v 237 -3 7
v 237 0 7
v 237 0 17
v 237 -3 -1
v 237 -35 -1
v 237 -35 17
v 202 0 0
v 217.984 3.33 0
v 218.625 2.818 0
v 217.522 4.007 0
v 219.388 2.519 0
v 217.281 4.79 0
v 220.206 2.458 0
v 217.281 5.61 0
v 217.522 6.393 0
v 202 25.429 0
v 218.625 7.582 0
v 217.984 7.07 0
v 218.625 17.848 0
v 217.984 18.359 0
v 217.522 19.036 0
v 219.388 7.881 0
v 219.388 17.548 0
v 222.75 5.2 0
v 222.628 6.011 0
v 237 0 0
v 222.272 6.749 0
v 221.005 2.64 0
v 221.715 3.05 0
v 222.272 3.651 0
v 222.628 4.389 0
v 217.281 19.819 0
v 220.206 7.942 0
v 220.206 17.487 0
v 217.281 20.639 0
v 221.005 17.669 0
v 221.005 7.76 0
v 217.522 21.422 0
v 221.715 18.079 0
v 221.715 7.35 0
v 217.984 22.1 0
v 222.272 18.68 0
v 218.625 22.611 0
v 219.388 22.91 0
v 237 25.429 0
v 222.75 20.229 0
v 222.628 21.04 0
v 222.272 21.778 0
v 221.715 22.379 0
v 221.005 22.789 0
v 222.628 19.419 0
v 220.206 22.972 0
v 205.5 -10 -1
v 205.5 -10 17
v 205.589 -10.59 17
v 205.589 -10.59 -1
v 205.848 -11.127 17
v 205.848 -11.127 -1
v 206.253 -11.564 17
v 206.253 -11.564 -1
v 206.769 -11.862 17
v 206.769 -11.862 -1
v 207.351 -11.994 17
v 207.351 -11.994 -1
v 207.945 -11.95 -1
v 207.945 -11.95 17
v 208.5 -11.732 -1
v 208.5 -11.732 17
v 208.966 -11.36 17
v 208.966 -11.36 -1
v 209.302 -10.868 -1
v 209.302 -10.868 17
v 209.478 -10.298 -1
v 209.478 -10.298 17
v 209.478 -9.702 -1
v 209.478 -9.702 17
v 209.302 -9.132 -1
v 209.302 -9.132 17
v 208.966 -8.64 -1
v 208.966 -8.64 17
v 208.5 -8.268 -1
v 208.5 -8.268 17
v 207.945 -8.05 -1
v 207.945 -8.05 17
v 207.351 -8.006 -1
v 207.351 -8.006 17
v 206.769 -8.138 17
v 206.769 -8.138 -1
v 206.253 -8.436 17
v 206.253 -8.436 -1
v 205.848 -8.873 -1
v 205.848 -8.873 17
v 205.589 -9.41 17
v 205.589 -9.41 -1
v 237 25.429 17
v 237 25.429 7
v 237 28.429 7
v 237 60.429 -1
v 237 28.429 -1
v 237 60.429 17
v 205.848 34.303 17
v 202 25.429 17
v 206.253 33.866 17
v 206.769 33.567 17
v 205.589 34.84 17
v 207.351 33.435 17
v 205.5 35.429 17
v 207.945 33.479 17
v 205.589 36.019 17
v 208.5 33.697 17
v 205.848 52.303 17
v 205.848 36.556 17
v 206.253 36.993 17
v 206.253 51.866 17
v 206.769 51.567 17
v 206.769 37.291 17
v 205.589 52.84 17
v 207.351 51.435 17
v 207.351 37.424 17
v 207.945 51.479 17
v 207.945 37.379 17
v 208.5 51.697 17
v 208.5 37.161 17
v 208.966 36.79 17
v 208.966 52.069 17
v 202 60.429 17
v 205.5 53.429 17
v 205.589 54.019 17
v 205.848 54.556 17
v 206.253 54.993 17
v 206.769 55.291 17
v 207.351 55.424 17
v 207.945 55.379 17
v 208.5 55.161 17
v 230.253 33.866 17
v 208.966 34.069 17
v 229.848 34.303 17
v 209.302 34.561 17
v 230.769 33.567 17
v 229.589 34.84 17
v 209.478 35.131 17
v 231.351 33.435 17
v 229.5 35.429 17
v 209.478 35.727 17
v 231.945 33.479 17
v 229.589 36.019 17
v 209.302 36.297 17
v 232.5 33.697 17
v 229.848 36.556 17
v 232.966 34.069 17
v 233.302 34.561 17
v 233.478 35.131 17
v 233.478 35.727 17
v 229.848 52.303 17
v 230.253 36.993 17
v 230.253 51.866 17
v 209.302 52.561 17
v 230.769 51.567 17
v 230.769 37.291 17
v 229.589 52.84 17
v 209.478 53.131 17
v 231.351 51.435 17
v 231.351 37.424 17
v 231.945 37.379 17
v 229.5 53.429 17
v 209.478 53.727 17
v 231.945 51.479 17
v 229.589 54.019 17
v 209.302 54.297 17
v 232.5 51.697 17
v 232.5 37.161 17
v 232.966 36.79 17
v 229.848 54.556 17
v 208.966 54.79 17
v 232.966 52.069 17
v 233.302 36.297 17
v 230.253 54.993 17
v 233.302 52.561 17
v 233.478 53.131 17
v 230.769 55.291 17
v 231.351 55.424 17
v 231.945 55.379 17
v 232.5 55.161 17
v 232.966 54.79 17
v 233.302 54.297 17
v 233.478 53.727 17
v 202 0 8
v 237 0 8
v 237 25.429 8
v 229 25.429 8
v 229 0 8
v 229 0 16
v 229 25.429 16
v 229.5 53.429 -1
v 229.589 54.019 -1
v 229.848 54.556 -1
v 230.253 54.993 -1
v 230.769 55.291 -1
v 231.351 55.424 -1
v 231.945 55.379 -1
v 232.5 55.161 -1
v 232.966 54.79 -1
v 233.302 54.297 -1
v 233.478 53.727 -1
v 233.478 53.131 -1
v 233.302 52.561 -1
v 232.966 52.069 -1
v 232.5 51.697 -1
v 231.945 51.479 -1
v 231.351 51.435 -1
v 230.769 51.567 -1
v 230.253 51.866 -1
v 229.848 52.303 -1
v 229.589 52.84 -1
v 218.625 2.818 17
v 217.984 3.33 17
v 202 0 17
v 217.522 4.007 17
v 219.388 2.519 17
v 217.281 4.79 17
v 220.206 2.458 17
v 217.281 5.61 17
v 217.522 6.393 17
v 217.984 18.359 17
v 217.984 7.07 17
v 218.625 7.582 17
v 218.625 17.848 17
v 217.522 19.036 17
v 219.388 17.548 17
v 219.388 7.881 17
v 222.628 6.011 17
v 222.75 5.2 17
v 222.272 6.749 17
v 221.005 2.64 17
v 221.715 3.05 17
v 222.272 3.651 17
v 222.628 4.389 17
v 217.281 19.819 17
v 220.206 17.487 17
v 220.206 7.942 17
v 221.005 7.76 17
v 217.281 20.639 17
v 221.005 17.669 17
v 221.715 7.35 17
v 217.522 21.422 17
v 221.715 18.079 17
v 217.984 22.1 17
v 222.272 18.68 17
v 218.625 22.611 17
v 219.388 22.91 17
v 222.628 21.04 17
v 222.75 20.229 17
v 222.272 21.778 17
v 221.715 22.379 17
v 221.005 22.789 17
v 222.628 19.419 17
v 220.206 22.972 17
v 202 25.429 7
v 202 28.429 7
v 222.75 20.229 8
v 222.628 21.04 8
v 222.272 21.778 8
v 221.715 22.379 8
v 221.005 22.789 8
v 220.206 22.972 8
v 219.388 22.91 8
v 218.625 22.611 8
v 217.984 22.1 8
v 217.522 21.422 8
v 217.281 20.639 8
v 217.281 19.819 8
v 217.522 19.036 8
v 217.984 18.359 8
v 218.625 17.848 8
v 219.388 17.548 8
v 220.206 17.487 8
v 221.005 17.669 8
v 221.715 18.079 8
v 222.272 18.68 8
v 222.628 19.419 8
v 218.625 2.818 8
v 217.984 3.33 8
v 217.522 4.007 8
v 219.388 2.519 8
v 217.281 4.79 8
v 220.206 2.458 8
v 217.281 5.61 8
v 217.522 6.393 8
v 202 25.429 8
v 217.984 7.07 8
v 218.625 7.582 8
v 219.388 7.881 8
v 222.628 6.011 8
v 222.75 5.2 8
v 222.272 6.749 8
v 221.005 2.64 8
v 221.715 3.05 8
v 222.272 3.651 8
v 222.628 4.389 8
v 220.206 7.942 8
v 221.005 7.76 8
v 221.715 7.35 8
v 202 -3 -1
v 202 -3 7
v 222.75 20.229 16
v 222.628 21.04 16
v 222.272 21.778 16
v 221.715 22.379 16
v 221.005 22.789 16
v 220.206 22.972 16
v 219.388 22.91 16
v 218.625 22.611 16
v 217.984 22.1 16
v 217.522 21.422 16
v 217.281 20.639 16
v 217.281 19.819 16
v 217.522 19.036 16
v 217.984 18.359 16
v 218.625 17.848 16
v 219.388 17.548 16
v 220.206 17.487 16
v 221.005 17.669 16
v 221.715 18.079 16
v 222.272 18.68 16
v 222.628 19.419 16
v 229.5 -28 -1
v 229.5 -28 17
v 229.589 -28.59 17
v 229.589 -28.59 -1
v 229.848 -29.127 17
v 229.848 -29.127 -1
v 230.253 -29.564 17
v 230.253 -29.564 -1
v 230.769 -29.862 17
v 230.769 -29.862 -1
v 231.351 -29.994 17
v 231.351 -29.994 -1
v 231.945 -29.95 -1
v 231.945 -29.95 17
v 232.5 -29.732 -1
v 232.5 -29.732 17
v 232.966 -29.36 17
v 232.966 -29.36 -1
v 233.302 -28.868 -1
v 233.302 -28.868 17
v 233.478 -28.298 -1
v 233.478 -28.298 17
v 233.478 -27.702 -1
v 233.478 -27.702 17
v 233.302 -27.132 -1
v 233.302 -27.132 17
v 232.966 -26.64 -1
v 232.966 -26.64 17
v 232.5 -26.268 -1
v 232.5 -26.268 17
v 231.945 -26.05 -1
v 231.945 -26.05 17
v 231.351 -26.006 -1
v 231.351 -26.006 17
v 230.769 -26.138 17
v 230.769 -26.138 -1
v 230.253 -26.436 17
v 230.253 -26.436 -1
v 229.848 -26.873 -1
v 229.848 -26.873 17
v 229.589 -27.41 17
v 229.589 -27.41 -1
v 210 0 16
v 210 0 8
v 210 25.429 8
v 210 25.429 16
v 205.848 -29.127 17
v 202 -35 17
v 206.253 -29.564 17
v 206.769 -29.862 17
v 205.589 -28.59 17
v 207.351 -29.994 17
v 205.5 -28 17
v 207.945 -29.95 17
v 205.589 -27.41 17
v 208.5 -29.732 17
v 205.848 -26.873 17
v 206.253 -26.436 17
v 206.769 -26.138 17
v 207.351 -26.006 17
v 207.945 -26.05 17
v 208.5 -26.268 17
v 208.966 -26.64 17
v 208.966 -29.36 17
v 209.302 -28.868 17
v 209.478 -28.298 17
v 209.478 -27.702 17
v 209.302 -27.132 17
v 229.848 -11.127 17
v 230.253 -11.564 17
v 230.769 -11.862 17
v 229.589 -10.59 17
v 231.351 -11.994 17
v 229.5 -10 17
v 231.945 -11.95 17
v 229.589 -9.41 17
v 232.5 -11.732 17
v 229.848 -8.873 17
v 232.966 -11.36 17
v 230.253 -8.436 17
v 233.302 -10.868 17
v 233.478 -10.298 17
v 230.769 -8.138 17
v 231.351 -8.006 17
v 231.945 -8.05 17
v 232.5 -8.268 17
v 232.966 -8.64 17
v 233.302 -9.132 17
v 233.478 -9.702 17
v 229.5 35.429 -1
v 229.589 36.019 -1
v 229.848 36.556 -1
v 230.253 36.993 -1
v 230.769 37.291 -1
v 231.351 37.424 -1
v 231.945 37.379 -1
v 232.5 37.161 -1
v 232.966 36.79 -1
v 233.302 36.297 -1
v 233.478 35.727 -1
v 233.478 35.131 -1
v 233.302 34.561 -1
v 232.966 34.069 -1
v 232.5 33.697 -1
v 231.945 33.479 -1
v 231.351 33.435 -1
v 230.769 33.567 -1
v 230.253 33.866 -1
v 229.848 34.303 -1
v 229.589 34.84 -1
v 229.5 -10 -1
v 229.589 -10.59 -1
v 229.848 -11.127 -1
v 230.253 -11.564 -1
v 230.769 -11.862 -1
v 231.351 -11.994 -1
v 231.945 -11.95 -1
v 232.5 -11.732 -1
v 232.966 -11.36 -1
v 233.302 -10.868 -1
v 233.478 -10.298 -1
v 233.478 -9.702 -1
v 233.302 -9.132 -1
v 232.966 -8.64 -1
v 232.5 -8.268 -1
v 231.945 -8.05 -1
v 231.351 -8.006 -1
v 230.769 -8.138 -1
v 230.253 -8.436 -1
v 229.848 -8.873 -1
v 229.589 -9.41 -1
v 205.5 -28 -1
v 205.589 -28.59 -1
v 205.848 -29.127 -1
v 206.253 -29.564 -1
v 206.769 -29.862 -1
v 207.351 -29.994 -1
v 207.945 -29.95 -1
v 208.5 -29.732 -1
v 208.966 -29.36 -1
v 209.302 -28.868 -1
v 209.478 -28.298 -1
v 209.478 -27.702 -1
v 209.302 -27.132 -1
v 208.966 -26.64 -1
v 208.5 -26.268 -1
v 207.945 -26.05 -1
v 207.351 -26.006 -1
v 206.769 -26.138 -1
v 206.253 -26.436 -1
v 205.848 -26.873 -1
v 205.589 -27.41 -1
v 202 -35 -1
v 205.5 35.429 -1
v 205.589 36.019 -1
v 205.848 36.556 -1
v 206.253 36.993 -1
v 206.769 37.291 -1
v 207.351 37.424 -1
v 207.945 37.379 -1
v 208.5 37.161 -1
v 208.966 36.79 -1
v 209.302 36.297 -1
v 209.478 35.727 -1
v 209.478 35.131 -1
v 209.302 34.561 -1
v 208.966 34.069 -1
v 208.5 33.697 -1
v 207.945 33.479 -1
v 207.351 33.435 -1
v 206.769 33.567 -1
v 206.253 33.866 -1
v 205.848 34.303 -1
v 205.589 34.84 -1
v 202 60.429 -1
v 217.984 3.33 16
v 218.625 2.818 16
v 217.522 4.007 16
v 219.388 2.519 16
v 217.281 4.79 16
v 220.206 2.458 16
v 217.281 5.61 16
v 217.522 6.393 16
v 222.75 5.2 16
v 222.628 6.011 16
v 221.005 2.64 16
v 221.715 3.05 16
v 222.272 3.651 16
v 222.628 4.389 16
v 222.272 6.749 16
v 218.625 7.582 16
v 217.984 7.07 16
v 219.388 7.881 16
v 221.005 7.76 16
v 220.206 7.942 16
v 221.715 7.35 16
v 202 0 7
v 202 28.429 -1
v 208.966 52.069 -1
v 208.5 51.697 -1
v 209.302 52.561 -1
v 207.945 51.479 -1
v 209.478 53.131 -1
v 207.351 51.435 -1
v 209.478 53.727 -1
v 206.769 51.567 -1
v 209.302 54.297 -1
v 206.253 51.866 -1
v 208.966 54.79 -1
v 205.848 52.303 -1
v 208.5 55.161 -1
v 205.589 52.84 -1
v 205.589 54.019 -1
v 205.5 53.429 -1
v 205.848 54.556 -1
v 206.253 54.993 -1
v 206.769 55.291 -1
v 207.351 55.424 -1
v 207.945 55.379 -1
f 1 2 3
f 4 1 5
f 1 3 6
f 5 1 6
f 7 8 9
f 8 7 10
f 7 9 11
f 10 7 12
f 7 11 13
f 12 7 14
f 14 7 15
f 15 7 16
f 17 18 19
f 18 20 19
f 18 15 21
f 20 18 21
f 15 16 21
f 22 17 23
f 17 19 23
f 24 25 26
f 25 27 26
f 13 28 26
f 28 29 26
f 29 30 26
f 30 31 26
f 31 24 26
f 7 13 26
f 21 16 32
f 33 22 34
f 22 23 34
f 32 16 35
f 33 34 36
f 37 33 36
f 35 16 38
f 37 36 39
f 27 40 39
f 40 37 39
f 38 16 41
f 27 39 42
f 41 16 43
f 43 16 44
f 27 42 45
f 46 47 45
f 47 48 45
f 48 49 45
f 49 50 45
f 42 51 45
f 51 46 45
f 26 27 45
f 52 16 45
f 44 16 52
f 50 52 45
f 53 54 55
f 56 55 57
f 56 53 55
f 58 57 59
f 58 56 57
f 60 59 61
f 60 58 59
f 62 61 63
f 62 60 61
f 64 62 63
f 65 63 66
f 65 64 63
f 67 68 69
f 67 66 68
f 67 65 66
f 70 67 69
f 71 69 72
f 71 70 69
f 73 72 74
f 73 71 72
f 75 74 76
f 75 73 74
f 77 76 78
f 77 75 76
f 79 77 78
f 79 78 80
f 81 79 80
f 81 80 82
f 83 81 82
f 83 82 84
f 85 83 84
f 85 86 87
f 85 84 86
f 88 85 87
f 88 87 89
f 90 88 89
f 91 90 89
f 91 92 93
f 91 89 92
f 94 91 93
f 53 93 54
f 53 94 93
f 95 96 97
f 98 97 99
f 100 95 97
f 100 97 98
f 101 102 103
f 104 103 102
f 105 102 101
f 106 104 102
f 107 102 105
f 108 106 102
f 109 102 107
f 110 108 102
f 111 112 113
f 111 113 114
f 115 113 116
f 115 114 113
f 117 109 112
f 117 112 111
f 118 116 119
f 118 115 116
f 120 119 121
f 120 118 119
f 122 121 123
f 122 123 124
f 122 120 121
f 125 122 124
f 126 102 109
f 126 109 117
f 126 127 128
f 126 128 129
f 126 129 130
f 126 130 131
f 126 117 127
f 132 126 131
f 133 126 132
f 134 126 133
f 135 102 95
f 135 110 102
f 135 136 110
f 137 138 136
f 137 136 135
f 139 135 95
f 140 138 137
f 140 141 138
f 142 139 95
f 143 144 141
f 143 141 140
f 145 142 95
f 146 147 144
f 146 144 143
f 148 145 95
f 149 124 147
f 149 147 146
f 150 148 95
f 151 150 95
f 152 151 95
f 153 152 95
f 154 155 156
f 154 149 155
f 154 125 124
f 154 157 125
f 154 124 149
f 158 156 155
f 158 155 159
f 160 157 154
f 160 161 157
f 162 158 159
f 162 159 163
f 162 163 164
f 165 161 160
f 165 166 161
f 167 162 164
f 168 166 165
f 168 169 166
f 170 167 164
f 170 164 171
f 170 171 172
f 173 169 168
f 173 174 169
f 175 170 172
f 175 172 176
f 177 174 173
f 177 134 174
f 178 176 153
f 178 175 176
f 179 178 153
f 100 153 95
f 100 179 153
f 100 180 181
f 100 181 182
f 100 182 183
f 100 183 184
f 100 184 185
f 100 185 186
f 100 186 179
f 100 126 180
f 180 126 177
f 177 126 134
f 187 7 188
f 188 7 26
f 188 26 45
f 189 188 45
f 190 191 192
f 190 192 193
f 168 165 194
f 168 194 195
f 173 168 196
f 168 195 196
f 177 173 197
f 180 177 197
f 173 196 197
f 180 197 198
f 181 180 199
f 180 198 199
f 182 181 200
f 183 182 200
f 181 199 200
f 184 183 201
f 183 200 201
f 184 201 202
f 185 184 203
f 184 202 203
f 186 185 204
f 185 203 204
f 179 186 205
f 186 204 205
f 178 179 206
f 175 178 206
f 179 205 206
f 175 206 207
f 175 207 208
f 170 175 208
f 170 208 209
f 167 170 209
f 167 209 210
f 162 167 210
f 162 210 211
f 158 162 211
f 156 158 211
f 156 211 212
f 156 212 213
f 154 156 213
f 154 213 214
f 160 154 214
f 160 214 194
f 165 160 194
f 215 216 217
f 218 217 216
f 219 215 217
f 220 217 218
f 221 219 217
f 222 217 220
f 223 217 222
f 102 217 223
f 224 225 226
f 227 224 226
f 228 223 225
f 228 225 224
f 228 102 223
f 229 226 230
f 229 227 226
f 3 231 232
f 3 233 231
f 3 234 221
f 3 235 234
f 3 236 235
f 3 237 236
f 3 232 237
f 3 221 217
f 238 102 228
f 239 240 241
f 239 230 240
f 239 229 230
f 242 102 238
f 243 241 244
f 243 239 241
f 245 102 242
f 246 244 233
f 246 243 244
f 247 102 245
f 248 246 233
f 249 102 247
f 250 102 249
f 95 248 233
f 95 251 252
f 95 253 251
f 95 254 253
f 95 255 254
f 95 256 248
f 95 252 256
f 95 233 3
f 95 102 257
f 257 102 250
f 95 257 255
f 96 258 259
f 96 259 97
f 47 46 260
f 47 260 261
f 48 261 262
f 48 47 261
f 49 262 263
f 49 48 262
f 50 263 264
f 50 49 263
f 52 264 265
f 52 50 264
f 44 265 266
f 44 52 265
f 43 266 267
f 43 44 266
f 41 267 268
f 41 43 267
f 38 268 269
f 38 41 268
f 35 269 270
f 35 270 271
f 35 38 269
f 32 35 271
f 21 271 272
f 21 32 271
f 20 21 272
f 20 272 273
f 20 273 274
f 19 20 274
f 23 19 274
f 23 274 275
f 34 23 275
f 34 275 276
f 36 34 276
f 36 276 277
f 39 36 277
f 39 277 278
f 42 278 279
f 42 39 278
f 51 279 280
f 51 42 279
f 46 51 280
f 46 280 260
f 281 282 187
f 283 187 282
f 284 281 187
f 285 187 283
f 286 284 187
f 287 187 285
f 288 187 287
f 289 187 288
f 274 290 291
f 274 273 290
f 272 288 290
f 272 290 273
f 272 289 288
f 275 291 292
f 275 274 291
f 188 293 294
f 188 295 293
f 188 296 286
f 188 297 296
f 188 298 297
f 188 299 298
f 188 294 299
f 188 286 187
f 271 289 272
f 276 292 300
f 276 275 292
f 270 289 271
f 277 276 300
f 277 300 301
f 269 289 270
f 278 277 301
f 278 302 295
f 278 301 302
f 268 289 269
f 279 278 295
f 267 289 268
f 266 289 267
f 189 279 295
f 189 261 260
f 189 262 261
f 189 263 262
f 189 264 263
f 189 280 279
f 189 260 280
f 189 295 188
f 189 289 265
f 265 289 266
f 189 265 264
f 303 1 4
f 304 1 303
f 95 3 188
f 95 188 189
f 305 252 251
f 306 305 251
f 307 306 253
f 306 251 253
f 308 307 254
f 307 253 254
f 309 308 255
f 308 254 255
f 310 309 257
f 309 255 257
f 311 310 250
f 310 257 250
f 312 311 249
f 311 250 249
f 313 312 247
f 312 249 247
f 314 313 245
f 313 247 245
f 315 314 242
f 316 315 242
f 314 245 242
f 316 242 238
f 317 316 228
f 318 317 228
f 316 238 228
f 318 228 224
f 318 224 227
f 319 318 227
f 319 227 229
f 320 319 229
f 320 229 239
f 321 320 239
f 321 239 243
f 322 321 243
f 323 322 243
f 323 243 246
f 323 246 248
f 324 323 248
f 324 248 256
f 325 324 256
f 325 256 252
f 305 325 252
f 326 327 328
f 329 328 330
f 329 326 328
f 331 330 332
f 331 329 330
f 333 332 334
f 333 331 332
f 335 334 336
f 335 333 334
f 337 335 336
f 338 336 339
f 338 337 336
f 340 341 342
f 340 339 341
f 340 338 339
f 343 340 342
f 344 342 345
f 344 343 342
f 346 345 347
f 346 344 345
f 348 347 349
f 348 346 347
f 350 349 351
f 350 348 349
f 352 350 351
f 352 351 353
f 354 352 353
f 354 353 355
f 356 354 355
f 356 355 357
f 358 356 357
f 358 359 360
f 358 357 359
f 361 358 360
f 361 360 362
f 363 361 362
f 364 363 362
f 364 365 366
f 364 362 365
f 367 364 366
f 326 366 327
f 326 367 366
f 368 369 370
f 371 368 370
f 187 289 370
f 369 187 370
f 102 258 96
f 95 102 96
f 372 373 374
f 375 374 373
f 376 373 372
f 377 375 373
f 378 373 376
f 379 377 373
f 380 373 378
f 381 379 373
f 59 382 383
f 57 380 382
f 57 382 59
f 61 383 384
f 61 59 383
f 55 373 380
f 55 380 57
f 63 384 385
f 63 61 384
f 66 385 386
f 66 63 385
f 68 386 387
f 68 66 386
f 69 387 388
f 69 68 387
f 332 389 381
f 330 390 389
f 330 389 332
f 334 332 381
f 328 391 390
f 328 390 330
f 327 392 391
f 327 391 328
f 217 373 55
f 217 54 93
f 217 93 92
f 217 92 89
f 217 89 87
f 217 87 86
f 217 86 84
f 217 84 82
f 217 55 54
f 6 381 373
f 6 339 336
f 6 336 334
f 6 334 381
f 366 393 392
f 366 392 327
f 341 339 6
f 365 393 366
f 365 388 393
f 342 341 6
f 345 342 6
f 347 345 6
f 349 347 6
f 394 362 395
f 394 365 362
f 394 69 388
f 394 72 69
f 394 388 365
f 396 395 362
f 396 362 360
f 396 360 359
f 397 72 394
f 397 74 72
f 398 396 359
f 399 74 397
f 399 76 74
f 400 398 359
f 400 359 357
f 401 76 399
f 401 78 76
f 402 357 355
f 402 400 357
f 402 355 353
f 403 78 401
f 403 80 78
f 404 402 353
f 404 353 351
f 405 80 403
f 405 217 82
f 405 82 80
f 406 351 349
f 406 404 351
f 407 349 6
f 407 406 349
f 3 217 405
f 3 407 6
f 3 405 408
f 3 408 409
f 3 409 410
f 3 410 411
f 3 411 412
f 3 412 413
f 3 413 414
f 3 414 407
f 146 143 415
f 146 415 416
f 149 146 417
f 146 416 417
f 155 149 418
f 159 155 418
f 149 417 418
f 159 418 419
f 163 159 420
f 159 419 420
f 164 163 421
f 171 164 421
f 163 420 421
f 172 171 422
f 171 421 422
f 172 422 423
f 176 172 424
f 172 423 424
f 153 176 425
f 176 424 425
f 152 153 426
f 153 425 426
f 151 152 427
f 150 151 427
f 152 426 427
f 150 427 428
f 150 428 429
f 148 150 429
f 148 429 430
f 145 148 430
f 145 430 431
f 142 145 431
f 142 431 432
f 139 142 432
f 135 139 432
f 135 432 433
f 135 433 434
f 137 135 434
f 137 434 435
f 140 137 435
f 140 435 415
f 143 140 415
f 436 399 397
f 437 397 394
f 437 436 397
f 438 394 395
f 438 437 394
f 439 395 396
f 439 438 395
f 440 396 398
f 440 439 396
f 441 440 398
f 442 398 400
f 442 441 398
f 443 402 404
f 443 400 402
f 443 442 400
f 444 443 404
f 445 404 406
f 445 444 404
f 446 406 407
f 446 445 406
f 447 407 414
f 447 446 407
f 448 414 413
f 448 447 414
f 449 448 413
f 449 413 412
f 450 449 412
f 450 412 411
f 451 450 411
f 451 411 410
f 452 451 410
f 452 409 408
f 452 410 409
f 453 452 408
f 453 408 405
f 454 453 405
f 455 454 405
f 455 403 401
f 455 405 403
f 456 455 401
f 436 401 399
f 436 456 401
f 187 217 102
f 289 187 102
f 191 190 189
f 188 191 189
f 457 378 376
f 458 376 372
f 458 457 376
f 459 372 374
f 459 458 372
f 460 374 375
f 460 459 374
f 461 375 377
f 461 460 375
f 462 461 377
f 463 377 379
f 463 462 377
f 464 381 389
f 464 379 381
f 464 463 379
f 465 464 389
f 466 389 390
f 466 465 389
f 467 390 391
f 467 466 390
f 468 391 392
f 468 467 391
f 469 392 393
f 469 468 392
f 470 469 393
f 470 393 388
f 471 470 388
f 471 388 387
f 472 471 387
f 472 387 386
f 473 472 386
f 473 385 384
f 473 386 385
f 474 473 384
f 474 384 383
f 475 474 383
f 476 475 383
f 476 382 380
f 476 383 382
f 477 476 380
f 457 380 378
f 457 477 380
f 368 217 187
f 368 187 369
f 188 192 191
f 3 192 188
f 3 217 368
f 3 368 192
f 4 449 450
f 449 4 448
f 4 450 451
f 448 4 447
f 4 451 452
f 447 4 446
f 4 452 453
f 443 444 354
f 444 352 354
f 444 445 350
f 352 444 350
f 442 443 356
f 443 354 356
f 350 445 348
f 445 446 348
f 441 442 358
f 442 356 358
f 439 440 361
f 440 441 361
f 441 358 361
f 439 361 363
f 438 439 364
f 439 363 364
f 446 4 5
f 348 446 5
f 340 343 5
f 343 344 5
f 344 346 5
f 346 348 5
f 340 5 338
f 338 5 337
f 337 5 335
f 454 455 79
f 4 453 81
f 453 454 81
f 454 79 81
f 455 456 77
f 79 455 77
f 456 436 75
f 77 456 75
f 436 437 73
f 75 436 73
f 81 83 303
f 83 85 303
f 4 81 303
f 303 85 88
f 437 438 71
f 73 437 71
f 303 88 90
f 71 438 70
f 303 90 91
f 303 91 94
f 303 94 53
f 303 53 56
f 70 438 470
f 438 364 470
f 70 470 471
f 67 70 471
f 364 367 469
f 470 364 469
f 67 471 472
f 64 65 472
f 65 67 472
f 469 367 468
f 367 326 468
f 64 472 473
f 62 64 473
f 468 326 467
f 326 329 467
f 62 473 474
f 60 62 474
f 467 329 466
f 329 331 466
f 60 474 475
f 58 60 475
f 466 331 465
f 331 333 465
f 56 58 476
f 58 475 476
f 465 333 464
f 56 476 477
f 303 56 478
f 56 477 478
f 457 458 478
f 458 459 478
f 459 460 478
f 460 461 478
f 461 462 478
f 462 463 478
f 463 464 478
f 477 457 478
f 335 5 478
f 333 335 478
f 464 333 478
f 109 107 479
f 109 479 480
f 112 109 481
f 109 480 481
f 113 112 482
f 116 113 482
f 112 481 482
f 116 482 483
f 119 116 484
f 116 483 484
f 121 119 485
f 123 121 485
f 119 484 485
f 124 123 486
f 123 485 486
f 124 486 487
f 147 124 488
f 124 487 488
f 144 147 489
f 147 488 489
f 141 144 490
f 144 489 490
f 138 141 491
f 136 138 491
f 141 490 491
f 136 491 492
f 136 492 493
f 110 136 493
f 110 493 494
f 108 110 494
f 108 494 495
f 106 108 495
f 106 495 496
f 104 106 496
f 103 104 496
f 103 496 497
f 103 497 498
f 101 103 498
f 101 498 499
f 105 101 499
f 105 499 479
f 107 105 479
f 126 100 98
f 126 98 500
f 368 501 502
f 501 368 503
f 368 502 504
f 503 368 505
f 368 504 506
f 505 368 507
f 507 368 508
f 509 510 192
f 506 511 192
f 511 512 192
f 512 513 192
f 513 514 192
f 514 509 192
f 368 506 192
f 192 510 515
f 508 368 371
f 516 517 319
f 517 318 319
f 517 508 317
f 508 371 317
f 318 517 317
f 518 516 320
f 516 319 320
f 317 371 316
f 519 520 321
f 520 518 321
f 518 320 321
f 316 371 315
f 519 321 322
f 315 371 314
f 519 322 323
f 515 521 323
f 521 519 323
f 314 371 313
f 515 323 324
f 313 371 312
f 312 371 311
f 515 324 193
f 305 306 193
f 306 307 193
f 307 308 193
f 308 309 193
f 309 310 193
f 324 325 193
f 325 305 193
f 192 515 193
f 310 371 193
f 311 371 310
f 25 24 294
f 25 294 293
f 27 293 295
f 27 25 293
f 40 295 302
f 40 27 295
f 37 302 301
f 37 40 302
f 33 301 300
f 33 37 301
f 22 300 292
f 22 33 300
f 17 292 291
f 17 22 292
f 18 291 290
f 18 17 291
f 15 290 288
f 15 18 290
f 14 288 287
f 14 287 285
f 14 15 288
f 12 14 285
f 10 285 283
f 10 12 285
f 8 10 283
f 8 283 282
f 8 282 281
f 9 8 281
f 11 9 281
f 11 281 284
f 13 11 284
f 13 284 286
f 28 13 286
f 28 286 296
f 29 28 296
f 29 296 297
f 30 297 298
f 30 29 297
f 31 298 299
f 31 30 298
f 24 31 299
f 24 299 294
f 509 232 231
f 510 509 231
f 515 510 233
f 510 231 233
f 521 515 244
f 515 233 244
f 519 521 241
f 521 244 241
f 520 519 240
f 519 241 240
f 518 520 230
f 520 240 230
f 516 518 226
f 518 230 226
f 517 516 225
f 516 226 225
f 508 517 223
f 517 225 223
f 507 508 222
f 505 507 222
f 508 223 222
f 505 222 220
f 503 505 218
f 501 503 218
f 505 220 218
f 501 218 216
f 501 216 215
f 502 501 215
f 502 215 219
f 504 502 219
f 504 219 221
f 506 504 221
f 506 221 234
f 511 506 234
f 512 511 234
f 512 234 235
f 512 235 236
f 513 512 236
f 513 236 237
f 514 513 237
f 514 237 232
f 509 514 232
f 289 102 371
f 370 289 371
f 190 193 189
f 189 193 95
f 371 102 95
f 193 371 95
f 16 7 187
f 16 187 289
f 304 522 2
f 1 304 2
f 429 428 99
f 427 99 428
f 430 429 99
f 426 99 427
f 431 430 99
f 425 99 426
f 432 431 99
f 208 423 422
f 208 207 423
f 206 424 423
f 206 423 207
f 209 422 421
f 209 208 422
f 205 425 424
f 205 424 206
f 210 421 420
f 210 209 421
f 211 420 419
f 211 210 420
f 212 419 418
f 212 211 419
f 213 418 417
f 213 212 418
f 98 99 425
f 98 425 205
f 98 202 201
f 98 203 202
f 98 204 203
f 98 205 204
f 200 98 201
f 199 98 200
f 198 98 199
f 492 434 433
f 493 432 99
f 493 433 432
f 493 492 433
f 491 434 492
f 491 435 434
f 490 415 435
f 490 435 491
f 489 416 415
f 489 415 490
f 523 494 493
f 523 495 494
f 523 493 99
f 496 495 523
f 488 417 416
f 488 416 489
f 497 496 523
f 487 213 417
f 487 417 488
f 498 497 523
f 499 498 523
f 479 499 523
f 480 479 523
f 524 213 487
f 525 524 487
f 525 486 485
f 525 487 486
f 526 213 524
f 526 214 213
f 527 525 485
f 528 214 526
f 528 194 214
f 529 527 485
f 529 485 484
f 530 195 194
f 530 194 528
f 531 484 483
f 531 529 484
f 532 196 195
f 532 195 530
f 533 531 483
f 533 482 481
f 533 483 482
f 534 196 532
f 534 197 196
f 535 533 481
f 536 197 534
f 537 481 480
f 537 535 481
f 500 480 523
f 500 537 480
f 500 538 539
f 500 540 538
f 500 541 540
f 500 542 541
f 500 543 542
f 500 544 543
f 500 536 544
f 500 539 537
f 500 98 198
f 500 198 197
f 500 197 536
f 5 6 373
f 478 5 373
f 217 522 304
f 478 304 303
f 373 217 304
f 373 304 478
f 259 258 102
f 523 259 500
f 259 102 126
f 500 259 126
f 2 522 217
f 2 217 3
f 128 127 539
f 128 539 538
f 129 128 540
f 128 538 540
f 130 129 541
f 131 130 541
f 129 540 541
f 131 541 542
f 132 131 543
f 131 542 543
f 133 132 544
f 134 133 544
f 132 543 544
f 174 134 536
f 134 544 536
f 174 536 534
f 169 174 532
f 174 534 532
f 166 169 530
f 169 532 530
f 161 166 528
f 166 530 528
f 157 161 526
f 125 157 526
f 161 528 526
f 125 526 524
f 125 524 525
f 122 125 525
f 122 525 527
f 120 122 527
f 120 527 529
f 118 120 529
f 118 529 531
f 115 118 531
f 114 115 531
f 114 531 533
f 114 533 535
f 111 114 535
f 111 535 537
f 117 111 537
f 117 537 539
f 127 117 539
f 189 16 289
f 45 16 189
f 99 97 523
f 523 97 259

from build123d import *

# Parameters (mm, degrees)
SKETCH2_W             = 35
SKETCH2_H             = 25.429203673
SKETCH2_R             = 2.75
BOSS_EXTRUDE1_DEPTH   = 8
SKETCH3_W             = 8
SKETCH3_H             = 25.429203673
BOSS_EXTRUDE2_DEPTH   = 8
BOSS_EXTRUDE2_2_DEPTH = 8
SKETCH4_W             = 35
SKETCH4_H             = 17
BOSS_EXTRUDE3_DEPTH   = 35
SKETCH5_W             = 35
SKETCH5_H             = 32
BOSS_EXTRUDE4_DEPTH   = 8
SKETCH7_R             = 2
CUT_EXTRUDE2_DEPTH    = 246.857049231
SKETCH6_W             = 35
SKETCH6_H             = 7
CUT_EXTRUDE1_DEPTH    = 257.615924903


with BuildPart() as part:
    # Sketch2 → Boss-Extrude1 (new body)
    with BuildSketch(Plane.XY):
        with Locations((219.5, 12.714601836)):
            Rectangle(SKETCH2_W, SKETCH2_H)
        with Locations((220, 5.2)):
            Circle(SKETCH2_R, mode=Mode.SUBTRACT)
        with Locations((220, 20.229203673)):
            Circle(SKETCH2_R, mode=Mode.SUBTRACT)
    boss_extrude1 = extrude(amount=BOSS_EXTRUDE1_DEPTH)


with BuildPart() as body_2:
    # Sketch3 → Boss-Extrude2 (new body)
    with BuildSketch(Plane.XY.offset(8)):
        with Locations((233, 12.714601836)):
            Rectangle(SKETCH3_W, SKETCH3_H)
    extrude(amount=BOSS_EXTRUDE2_DEPTH)



with BuildPart() as body_3:
    # Sketch3 → Boss-Extrude2 2 (new body)
    with BuildSketch(Plane.XY.offset(8)):
        with Locations((206, 12.714601836)):
            Rectangle(SKETCH3_W, SKETCH3_H)
    extrude(amount=BOSS_EXTRUDE2_2_DEPTH)


with BuildPart() as body_2_1:
    add(body_2.part)

    add(body_3.part)  # Mirror1 merges body 3
    # Mirror1: Boss-Extrude1 across plane
    add(boss_extrude1.mirror(Plane.XY.offset(12)))


with BuildPart() as body_3_2:
    # Sketch4 → Boss-Extrude3 (new body)
    with BuildSketch(Plane(origin=(0, 25.429203673, 0), x_dir=(1, 0, 0), z_dir=(0, 1, 0))):
        with Locations((219.5, -15.5)):
            Rectangle(SKETCH4_W, SKETCH4_H)
    extrude(amount=BOSS_EXTRUDE3_DEPTH)

    # Sketch5 → Boss-Extrude4 (add)
    with BuildSketch(Plane(origin=(0, 0, 7), x_dir=(-1, 0, 0), z_dir=(0, 0, -1))):
        with Locations((-219.5, 44.429203673)):
            Rectangle(SKETCH5_W, SKETCH5_H)
    extrude(amount=BOSS_EXTRUDE4_DEPTH)

    # Sketch7 → Cut-Extrude2 (cut, through all)
    with BuildSketch(Plane(origin=(0, 0, -1), x_dir=(-1, 0, 0), z_dir=(0, 0, -1))):
        with Locations((-231.5, 53.429203673)):
            Circle(SKETCH7_R)
        with Locations((-231.5, 35.429203673)):
            Circle(SKETCH7_R)
        with Locations((-207.5, 35.429203673)):
            Circle(SKETCH7_R)
        with Locations((-207.5, 53.429203673)):
            Circle(SKETCH7_R)
    extrude(amount=-CUT_EXTRUDE2_DEPTH, mode=Mode.SUBTRACT)


with BuildPart() as body_4:
    # Mirror2: mirrored copy
    add(body_3_2.part.mirror(Plane(origin=(0, 12.714601837, 0), x_dir=(0, 0, 1), z_dir=(0, -1, 0))))


with BuildPart() as cut_extrude1_tool:
    # Sketch6 → Cut-Extrude1 (new, through all)
    with BuildSketch(Plane(origin=(0, 60.429203673, 0), x_dir=(1, 0, 0), z_dir=(0, 1, 0))):
        with Locations((219.5, -20.5)):
            Rectangle(SKETCH6_W, SKETCH6_H)
    extrude(amount=-CUT_EXTRUDE1_DEPTH)


with BuildPart() as body_2_2:
    add(body_2_1.part)

    # Cut-Extrude1: cut by cut_extrude1_tool
    add(cut_extrude1_tool.part, mode=Mode.SUBTRACT)


with BuildPart() as body_3_2_1:
    add(body_3_2.part)

    # Cut-Extrude1: cut by cut_extrude1_tool
    add(cut_extrude1_tool.part, mode=Mode.SUBTRACT)


with BuildPart() as body_4_1:
    add(body_4.part)

    # Cut-Extrude1: cut by cut_extrude1_tool
    add(cut_extrude1_tool.part, mode=Mode.SUBTRACT)


solid = Compound([part.part, body_2_2.part, body_3_2_1.part, body_4_1.part])
